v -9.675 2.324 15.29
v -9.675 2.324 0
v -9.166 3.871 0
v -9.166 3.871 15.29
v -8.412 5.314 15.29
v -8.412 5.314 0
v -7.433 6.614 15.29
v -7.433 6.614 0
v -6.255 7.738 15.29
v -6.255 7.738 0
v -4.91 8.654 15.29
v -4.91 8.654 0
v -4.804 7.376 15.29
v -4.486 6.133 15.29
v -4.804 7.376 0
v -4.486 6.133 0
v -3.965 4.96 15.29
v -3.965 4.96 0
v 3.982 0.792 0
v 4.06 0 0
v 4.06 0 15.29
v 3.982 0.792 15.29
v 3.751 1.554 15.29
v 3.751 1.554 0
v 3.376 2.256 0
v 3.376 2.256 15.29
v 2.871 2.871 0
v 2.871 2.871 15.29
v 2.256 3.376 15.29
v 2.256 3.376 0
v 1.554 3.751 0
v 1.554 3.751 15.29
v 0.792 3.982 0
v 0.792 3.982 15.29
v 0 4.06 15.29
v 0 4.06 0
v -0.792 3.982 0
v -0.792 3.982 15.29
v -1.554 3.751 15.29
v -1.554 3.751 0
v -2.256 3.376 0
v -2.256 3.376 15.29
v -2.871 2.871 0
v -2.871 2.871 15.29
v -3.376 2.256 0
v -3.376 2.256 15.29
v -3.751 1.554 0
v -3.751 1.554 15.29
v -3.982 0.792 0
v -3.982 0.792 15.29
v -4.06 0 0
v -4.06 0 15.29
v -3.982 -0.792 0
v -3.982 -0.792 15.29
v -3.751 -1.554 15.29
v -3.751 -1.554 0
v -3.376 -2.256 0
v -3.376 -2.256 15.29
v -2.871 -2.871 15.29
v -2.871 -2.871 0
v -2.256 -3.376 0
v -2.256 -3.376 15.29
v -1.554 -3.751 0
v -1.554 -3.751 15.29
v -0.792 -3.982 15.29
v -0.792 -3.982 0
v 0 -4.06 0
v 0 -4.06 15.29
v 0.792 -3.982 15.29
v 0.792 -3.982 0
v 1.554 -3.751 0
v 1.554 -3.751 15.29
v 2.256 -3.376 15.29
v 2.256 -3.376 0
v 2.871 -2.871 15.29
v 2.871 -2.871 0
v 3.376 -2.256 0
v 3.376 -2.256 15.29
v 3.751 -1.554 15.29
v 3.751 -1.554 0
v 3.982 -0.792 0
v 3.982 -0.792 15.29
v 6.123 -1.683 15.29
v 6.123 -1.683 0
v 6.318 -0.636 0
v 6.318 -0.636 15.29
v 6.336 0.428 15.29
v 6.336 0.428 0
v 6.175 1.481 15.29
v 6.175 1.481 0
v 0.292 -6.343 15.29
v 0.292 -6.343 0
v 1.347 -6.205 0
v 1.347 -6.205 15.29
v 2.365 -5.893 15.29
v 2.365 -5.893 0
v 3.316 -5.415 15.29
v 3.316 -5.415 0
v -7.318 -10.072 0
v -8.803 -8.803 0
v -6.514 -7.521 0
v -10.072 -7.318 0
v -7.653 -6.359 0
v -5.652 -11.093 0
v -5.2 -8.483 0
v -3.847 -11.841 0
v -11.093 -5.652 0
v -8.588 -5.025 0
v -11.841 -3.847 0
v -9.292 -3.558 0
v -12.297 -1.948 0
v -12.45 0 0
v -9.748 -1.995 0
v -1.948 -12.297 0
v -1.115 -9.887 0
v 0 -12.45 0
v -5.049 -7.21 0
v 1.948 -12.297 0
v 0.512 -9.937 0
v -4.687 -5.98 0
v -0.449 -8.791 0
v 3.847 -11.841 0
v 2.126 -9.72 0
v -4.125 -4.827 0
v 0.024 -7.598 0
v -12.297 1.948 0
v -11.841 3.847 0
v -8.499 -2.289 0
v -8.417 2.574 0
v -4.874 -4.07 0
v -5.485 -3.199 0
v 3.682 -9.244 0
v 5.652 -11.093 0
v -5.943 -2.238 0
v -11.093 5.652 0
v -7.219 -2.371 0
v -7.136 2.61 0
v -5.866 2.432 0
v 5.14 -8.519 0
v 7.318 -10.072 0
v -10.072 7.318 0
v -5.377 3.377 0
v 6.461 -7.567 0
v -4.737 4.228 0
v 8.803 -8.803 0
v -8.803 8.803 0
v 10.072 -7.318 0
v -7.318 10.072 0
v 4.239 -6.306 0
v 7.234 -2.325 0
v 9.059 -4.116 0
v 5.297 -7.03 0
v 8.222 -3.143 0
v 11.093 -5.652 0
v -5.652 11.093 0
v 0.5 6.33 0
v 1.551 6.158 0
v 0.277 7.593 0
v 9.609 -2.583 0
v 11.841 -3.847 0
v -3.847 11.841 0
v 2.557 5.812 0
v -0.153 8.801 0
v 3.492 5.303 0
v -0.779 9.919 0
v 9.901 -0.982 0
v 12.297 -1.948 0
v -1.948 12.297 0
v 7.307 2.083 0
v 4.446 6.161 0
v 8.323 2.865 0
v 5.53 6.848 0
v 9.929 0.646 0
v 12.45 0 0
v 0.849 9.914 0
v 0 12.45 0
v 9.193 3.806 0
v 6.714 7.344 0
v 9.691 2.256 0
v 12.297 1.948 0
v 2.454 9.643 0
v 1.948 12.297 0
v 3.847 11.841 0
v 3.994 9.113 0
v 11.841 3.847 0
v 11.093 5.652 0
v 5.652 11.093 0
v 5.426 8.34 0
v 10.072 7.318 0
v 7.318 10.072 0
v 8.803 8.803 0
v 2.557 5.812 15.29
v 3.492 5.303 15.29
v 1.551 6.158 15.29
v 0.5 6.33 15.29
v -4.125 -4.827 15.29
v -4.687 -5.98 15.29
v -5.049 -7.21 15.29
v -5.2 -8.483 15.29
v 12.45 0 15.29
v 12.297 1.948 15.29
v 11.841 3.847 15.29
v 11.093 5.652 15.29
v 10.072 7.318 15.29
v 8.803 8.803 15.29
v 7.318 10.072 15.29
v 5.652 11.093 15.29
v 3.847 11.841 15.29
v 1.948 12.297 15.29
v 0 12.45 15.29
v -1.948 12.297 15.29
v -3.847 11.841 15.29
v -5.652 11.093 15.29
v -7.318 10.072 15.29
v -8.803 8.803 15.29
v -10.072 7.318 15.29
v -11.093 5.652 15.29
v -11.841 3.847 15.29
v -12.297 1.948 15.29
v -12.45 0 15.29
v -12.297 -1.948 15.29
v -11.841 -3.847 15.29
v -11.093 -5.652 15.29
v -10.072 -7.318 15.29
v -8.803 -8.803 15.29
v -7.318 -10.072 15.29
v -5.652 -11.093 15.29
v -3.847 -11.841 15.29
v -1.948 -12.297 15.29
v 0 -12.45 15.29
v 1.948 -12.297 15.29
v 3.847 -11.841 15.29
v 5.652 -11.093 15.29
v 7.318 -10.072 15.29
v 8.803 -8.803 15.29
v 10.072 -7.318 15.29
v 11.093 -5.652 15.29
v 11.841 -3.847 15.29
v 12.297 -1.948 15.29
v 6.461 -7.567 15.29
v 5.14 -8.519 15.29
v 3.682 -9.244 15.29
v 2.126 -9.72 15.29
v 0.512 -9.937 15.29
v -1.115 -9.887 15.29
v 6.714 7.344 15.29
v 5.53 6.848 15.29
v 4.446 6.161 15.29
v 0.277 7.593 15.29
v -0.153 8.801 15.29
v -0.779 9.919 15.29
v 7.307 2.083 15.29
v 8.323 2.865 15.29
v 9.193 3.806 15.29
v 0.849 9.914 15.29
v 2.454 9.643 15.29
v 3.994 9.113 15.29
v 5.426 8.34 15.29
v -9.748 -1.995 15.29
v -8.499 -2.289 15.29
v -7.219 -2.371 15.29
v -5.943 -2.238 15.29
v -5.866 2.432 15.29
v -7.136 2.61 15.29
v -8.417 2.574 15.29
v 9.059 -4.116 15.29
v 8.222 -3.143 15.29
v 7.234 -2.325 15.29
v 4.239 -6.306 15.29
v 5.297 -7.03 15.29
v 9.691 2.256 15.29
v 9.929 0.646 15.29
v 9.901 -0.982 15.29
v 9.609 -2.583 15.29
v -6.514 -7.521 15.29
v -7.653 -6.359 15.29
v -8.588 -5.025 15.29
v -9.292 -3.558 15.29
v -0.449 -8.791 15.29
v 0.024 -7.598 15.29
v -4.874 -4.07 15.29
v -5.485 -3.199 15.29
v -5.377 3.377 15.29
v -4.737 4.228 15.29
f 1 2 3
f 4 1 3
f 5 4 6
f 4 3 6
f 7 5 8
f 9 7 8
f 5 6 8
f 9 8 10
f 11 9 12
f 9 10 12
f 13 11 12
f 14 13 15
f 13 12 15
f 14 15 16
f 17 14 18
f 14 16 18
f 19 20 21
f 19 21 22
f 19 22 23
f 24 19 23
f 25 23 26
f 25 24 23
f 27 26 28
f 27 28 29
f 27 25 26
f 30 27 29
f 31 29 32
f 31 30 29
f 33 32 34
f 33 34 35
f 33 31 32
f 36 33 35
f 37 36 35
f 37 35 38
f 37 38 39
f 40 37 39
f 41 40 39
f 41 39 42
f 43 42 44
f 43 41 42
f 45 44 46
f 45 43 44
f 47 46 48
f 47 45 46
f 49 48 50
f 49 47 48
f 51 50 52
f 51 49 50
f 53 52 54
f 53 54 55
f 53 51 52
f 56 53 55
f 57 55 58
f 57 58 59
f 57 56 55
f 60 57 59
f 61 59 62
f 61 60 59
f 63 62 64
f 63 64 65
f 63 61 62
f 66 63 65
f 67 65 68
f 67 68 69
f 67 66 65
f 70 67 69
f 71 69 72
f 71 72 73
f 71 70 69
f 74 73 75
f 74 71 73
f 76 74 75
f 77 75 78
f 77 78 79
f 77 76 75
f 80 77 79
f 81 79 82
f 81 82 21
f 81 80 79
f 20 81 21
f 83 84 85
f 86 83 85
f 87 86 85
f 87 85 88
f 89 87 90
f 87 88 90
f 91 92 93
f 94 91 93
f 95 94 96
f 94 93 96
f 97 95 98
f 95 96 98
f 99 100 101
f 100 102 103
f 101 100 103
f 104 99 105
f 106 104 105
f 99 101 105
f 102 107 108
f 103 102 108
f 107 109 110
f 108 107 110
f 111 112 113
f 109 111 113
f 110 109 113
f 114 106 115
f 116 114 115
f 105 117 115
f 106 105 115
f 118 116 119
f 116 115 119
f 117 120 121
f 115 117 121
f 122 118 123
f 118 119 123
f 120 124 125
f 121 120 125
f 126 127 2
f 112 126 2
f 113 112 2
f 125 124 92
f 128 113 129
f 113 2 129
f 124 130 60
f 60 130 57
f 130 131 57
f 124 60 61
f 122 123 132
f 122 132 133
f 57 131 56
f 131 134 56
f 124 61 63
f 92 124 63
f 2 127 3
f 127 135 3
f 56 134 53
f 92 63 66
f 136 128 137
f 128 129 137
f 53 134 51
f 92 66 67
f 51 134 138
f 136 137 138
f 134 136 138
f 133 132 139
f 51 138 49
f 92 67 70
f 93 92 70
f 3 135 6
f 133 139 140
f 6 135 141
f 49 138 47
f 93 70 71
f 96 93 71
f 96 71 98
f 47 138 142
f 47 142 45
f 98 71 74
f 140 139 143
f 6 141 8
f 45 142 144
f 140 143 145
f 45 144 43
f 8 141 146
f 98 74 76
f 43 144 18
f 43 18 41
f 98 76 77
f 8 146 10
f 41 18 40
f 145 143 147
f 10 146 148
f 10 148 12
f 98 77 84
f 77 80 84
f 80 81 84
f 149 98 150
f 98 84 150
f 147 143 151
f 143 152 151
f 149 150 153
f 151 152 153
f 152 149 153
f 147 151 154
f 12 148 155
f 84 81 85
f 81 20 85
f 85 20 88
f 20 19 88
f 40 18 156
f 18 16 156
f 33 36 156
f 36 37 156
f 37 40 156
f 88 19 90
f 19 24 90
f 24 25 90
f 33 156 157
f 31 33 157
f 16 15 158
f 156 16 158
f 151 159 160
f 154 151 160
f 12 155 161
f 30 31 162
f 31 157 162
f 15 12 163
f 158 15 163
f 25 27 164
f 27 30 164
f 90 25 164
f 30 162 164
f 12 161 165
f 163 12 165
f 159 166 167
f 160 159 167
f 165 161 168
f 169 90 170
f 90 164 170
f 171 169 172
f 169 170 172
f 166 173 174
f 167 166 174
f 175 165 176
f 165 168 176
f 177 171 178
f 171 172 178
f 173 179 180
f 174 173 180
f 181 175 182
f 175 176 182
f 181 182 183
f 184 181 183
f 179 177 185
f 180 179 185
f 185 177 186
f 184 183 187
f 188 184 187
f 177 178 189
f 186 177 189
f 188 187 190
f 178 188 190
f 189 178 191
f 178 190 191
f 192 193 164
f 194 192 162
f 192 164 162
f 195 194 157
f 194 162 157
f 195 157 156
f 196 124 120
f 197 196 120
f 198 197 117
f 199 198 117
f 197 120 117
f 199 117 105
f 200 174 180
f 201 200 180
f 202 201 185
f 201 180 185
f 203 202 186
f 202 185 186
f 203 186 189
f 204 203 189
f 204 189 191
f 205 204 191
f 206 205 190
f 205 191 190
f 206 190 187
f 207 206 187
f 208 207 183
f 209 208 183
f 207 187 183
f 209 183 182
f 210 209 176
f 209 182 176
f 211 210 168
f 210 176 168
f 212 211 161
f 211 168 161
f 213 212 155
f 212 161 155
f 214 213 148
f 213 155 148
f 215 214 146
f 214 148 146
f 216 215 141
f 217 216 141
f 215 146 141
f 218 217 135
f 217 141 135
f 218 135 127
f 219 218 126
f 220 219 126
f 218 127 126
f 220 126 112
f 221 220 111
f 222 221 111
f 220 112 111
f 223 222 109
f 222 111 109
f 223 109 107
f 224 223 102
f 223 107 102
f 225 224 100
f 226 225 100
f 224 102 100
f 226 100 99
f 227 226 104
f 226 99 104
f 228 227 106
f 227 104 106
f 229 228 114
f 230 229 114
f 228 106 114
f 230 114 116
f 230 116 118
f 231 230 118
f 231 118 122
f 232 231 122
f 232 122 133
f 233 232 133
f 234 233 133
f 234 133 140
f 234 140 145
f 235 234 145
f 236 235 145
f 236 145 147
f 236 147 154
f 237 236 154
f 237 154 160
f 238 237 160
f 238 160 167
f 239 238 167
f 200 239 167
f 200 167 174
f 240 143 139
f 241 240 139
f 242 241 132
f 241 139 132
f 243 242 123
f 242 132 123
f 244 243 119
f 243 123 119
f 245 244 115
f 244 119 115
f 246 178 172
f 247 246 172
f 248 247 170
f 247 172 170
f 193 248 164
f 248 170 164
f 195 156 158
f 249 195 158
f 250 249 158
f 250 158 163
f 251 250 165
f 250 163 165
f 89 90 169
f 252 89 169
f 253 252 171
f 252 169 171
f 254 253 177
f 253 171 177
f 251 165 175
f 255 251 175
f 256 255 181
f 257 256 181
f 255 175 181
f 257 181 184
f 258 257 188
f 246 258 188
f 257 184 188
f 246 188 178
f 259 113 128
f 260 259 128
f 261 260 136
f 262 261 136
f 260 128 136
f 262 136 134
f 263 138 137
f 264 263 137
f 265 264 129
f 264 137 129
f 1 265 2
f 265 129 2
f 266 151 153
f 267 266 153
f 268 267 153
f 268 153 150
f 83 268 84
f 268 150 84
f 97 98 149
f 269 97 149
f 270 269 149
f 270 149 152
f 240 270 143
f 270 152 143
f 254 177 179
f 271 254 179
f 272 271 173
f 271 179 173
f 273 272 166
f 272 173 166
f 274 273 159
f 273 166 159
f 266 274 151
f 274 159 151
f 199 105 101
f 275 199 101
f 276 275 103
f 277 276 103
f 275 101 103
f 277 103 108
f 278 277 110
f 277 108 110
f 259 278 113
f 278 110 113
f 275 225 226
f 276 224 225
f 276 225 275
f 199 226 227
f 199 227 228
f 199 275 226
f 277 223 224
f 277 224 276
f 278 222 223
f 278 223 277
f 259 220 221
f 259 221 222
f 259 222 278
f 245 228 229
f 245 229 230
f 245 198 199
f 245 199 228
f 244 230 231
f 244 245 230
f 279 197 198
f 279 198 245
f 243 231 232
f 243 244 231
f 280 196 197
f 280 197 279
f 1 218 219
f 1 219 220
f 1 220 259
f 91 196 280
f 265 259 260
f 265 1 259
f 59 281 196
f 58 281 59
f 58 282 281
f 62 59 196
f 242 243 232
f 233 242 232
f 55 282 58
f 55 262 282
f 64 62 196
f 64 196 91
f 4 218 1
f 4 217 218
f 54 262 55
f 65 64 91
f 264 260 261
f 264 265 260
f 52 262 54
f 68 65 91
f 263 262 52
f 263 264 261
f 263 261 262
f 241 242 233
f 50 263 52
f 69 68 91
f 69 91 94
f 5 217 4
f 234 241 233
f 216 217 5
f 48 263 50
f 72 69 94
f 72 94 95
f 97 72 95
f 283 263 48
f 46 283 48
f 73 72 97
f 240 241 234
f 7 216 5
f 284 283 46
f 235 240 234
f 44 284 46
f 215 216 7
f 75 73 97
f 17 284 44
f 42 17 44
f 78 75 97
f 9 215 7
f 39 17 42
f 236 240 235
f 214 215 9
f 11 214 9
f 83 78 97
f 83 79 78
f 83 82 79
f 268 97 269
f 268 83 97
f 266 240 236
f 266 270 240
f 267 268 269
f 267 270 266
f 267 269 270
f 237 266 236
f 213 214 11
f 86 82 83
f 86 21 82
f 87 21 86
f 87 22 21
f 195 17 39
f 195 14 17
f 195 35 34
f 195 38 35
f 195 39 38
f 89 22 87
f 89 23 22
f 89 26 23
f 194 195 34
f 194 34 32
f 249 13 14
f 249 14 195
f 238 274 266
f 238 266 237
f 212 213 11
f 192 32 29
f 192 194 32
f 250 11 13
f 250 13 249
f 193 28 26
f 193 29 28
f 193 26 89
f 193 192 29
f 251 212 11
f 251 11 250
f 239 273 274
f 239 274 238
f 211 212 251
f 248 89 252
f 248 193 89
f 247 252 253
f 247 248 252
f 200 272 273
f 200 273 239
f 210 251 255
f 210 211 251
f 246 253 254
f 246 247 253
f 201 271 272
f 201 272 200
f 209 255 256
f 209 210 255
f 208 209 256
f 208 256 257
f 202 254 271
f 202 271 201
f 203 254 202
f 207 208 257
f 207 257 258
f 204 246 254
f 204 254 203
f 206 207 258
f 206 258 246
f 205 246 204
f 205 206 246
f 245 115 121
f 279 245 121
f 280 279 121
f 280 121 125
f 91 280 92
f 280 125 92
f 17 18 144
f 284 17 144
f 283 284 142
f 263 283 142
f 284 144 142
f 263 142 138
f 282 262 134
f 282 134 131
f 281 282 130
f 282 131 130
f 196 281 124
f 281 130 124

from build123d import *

# Parameters (mm, degrees)
F0_R     = 12.45
F0_R_2   = 4.06
F1_DEPTH = 15.29


with BuildPart() as f1:
    # F0 (on Top) → F1 (new body)
    with BuildSketch(Plane.XY):
        Circle(F0_R)
        with BuildLine():
            ThreePointArc((-5.200227, -8.482932), (-8.147706, -5.711164), (-9.747939, -1.995039))
            ThreePointArc((-9.747939, -1.995039), (-7.860658, -2.357112), (-5.942674, -2.23766))
            ThreePointArc((-5.942674, -2.23766), (-5.197891, -3.647524), (-4.125369, -4.827404))
            ThreePointArc((-4.125369, -4.827404), (-4.893916, -6.587211), (-5.200227, -8.482932))
        make_face(mode=Mode.SUBTRACT)
        Circle(F0_R_2, mode=Mode.SUBTRACT)
        with BuildLine():
            ThreePointArc((6.460789, -7.56708), (2.91386, -9.513775), (-1.114884, -9.887342))
            ThreePointArc((-1.114884, -9.887342), (-0.187331, -8.204317), (0.291754, -6.343294))
            ThreePointArc((0.291754, -6.343294), (1.862765, -6.070635), (3.316325, -5.415209))
            ThreePointArc((3.316325, -5.415209), (4.752506, -6.689951), (6.460789, -7.56708))
        make_face(mode=Mode.SUBTRACT)
        with BuildLine():
            ThreePointArc((9.193215, 3.806219), (9.94857, -0.168673), (9.058903, -4.115674))
            ThreePointArc((9.058903, -4.115674), (7.744881, -2.713435), (6.122988, -1.682711))
            ThreePointArc((6.122988, -1.682711), (6.349143, -0.104335), (6.174971, 1.48062))
            ThreePointArc((6.174971, 1.48062), (7.831127, 2.452594), (9.193215, 3.806219))
        make_face(mode=Mode.SUBTRACT)
        with BuildLine():
            ThreePointArc((-9.674706, 2.32434), (-7.949419, 5.984082), (-4.909674, 8.65434))
            ThreePointArc((-4.909674, 8.65434), (-4.670823, 6.747542), (-3.964528, 4.960344))
            ThreePointArc((-3.964528, 4.960344), (-5.075238, 3.816341), (-5.865943, 2.43171))
            ThreePointArc((-5.865943, 2.43171), (-7.777113, 2.618831), (-9.674706, 2.32434))
        make_face(mode=Mode.SUBTRACT)
        with BuildLine():
            ThreePointArc((-0.77907, 9.919453), (3.234695, 9.40953), (6.713594, 7.343715))
            ThreePointArc((6.713594, 7.343715), (4.97393, 6.527322), (3.492461, 5.303321))
            ThreePointArc((3.492461, 5.303321), (2.061221, 6.006152), (0.500017, 6.330283))
            ThreePointArc((0.500017, 6.330283), (0.087396, 8.205737), (-0.77907, 9.919453))
        make_face(mode=Mode.SUBTRACT)
    extrude(amount=F1_DEPTH)


solid = f1.part
